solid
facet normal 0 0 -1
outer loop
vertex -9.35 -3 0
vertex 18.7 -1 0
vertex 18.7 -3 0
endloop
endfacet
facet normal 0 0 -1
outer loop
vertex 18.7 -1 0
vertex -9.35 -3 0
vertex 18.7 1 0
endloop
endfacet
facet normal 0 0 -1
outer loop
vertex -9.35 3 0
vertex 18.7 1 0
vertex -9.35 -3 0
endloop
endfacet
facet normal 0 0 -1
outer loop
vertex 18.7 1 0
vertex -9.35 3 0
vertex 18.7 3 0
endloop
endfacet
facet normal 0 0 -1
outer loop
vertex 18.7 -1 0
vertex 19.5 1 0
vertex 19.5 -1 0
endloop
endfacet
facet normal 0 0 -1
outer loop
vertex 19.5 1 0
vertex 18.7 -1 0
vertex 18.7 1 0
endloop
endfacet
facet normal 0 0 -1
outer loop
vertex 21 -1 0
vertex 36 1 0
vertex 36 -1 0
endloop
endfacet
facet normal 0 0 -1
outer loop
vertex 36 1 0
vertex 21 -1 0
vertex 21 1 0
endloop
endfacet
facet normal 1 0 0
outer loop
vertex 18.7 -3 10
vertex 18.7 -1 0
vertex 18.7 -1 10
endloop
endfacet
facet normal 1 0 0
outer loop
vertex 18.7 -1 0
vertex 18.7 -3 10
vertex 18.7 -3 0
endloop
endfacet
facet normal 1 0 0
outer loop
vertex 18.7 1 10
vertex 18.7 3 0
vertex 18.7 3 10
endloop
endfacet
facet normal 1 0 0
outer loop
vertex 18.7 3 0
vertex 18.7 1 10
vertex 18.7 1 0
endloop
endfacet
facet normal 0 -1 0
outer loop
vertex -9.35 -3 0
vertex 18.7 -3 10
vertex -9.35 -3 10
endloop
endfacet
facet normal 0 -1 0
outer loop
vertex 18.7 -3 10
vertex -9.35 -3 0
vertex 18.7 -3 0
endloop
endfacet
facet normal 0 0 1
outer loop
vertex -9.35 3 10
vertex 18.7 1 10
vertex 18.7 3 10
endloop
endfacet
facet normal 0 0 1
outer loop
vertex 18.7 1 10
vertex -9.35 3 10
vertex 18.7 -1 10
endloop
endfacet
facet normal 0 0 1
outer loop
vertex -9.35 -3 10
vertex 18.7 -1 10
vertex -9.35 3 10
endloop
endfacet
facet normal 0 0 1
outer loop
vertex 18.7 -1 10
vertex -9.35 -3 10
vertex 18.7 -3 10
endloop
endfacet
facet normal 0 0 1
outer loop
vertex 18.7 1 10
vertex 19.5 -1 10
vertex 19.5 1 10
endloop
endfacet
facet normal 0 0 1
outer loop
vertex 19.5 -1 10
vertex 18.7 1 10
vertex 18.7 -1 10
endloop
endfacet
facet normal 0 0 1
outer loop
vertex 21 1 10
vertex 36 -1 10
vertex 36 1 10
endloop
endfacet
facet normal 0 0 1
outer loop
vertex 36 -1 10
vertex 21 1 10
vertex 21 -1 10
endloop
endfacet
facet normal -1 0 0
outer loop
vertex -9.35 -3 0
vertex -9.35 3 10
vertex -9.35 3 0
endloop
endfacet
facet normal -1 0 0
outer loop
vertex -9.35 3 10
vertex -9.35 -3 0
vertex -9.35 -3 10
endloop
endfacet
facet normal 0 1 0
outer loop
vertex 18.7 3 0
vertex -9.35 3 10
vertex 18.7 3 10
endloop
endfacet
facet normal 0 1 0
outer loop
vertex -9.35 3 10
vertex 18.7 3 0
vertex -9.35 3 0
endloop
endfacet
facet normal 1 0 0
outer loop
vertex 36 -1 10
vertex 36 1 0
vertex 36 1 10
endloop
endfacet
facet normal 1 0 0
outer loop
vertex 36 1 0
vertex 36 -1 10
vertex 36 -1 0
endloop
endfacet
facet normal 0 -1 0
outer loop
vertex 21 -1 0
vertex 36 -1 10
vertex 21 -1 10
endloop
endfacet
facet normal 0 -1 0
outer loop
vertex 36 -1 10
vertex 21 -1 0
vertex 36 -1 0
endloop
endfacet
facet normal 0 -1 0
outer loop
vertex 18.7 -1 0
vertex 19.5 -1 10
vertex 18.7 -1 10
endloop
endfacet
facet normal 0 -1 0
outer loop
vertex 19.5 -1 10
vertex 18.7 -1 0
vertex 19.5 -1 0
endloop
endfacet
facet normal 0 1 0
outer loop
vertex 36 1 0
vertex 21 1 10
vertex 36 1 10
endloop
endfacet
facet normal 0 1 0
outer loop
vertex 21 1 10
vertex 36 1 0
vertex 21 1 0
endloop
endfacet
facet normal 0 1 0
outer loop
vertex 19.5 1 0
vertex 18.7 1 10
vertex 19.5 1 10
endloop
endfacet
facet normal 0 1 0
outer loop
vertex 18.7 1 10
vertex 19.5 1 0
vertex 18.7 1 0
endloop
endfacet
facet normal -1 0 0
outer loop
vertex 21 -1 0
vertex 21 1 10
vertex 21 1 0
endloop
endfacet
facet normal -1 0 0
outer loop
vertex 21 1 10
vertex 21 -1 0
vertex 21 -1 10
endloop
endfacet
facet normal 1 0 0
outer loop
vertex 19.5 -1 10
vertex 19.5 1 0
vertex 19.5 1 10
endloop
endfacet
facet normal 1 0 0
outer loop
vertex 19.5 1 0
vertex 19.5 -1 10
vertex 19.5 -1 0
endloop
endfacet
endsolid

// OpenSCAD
// Built by bench/smallmodels/features/compiler.py from a list of features.
$fn = 64;
difference() {
  union() {
    translate([0, 0, 0]) linear_extrude(height = 10) polygon([[-9.35, -3], [-9.35, 3], [18.7, 3], [18.7, -3]]);
    translate([15, 0, 0]) linear_extrude(height = 10) polygon([[-2.75, -1], [-2.75, 1], [21, 1], [21, -1]]);
  }
  union() {
    translate([-17.85, 0, 0]) rotate([0, 0, 0]) translate([-4.675, -3, 0]) cube([9.35, 6, 10]);
    translate([20.25, 0, 0]) rotate([0, 0, 0]) translate([-0.75, -2.25, 0]) cube([1.5, 4.5, 10]);
  }
}
